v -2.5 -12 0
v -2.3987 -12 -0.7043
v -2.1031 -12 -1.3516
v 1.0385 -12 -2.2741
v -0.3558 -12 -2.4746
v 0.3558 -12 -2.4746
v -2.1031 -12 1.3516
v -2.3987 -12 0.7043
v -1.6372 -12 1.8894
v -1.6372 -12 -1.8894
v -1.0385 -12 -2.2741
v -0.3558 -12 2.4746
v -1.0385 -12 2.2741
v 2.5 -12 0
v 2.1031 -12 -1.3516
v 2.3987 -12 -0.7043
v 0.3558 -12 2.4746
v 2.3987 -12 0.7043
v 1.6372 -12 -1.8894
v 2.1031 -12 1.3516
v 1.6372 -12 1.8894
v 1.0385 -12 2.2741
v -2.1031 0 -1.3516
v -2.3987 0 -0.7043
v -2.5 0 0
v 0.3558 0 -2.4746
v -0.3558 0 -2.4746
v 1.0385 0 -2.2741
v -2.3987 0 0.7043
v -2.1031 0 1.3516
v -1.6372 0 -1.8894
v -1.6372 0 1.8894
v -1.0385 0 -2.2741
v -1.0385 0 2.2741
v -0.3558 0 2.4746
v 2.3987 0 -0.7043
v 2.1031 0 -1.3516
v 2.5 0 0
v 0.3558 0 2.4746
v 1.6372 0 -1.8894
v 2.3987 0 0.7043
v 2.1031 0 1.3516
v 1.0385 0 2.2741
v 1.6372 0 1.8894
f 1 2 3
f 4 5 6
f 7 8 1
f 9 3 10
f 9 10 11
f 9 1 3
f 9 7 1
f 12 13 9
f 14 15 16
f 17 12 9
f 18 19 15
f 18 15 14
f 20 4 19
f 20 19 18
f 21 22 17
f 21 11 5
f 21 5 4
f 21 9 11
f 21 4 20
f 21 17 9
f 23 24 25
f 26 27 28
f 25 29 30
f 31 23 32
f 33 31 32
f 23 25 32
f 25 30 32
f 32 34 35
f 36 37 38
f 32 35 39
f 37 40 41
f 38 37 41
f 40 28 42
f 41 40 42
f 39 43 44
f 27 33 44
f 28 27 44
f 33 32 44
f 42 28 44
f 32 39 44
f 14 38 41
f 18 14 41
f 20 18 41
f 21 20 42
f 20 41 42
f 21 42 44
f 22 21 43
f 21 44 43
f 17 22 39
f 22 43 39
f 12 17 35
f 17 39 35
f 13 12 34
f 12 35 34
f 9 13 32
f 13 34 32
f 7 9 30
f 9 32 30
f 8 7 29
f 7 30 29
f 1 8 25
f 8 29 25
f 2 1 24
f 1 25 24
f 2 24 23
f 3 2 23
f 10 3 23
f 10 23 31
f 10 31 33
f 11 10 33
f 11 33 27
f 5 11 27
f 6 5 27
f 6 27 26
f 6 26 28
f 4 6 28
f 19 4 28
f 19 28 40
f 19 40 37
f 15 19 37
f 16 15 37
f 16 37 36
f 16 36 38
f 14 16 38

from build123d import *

# Parameters (mm, degrees)
F0_R     = 2.5
F1_DEPTH = 72
F2_DEPTH = 50
F3_DEPTH = 10


with BuildPart() as f1:
    # F0 (on Front) → F1 (new body)
    with BuildSketch(Plane.XZ):
        Circle(F0_R)
    extrude(amount=F1_DEPTH)

    # F2 (cut): a face of the model
    f2_faces = [f1.faces().sort_by_distance(p)[0] for p in [
        (0, -72, 0),
    ]]
    extrude(f2_faces, amount=-F2_DEPTH, mode=Mode.SUBTRACT)

    # F3 (cut): a face of the model
    f3_faces = [f1.faces().sort_by_distance(p)[0] for p in [
        (0, -22, 0),
    ]]
    extrude(f3_faces, amount=-F3_DEPTH, mode=Mode.SUBTRACT)


solid = f1.part
